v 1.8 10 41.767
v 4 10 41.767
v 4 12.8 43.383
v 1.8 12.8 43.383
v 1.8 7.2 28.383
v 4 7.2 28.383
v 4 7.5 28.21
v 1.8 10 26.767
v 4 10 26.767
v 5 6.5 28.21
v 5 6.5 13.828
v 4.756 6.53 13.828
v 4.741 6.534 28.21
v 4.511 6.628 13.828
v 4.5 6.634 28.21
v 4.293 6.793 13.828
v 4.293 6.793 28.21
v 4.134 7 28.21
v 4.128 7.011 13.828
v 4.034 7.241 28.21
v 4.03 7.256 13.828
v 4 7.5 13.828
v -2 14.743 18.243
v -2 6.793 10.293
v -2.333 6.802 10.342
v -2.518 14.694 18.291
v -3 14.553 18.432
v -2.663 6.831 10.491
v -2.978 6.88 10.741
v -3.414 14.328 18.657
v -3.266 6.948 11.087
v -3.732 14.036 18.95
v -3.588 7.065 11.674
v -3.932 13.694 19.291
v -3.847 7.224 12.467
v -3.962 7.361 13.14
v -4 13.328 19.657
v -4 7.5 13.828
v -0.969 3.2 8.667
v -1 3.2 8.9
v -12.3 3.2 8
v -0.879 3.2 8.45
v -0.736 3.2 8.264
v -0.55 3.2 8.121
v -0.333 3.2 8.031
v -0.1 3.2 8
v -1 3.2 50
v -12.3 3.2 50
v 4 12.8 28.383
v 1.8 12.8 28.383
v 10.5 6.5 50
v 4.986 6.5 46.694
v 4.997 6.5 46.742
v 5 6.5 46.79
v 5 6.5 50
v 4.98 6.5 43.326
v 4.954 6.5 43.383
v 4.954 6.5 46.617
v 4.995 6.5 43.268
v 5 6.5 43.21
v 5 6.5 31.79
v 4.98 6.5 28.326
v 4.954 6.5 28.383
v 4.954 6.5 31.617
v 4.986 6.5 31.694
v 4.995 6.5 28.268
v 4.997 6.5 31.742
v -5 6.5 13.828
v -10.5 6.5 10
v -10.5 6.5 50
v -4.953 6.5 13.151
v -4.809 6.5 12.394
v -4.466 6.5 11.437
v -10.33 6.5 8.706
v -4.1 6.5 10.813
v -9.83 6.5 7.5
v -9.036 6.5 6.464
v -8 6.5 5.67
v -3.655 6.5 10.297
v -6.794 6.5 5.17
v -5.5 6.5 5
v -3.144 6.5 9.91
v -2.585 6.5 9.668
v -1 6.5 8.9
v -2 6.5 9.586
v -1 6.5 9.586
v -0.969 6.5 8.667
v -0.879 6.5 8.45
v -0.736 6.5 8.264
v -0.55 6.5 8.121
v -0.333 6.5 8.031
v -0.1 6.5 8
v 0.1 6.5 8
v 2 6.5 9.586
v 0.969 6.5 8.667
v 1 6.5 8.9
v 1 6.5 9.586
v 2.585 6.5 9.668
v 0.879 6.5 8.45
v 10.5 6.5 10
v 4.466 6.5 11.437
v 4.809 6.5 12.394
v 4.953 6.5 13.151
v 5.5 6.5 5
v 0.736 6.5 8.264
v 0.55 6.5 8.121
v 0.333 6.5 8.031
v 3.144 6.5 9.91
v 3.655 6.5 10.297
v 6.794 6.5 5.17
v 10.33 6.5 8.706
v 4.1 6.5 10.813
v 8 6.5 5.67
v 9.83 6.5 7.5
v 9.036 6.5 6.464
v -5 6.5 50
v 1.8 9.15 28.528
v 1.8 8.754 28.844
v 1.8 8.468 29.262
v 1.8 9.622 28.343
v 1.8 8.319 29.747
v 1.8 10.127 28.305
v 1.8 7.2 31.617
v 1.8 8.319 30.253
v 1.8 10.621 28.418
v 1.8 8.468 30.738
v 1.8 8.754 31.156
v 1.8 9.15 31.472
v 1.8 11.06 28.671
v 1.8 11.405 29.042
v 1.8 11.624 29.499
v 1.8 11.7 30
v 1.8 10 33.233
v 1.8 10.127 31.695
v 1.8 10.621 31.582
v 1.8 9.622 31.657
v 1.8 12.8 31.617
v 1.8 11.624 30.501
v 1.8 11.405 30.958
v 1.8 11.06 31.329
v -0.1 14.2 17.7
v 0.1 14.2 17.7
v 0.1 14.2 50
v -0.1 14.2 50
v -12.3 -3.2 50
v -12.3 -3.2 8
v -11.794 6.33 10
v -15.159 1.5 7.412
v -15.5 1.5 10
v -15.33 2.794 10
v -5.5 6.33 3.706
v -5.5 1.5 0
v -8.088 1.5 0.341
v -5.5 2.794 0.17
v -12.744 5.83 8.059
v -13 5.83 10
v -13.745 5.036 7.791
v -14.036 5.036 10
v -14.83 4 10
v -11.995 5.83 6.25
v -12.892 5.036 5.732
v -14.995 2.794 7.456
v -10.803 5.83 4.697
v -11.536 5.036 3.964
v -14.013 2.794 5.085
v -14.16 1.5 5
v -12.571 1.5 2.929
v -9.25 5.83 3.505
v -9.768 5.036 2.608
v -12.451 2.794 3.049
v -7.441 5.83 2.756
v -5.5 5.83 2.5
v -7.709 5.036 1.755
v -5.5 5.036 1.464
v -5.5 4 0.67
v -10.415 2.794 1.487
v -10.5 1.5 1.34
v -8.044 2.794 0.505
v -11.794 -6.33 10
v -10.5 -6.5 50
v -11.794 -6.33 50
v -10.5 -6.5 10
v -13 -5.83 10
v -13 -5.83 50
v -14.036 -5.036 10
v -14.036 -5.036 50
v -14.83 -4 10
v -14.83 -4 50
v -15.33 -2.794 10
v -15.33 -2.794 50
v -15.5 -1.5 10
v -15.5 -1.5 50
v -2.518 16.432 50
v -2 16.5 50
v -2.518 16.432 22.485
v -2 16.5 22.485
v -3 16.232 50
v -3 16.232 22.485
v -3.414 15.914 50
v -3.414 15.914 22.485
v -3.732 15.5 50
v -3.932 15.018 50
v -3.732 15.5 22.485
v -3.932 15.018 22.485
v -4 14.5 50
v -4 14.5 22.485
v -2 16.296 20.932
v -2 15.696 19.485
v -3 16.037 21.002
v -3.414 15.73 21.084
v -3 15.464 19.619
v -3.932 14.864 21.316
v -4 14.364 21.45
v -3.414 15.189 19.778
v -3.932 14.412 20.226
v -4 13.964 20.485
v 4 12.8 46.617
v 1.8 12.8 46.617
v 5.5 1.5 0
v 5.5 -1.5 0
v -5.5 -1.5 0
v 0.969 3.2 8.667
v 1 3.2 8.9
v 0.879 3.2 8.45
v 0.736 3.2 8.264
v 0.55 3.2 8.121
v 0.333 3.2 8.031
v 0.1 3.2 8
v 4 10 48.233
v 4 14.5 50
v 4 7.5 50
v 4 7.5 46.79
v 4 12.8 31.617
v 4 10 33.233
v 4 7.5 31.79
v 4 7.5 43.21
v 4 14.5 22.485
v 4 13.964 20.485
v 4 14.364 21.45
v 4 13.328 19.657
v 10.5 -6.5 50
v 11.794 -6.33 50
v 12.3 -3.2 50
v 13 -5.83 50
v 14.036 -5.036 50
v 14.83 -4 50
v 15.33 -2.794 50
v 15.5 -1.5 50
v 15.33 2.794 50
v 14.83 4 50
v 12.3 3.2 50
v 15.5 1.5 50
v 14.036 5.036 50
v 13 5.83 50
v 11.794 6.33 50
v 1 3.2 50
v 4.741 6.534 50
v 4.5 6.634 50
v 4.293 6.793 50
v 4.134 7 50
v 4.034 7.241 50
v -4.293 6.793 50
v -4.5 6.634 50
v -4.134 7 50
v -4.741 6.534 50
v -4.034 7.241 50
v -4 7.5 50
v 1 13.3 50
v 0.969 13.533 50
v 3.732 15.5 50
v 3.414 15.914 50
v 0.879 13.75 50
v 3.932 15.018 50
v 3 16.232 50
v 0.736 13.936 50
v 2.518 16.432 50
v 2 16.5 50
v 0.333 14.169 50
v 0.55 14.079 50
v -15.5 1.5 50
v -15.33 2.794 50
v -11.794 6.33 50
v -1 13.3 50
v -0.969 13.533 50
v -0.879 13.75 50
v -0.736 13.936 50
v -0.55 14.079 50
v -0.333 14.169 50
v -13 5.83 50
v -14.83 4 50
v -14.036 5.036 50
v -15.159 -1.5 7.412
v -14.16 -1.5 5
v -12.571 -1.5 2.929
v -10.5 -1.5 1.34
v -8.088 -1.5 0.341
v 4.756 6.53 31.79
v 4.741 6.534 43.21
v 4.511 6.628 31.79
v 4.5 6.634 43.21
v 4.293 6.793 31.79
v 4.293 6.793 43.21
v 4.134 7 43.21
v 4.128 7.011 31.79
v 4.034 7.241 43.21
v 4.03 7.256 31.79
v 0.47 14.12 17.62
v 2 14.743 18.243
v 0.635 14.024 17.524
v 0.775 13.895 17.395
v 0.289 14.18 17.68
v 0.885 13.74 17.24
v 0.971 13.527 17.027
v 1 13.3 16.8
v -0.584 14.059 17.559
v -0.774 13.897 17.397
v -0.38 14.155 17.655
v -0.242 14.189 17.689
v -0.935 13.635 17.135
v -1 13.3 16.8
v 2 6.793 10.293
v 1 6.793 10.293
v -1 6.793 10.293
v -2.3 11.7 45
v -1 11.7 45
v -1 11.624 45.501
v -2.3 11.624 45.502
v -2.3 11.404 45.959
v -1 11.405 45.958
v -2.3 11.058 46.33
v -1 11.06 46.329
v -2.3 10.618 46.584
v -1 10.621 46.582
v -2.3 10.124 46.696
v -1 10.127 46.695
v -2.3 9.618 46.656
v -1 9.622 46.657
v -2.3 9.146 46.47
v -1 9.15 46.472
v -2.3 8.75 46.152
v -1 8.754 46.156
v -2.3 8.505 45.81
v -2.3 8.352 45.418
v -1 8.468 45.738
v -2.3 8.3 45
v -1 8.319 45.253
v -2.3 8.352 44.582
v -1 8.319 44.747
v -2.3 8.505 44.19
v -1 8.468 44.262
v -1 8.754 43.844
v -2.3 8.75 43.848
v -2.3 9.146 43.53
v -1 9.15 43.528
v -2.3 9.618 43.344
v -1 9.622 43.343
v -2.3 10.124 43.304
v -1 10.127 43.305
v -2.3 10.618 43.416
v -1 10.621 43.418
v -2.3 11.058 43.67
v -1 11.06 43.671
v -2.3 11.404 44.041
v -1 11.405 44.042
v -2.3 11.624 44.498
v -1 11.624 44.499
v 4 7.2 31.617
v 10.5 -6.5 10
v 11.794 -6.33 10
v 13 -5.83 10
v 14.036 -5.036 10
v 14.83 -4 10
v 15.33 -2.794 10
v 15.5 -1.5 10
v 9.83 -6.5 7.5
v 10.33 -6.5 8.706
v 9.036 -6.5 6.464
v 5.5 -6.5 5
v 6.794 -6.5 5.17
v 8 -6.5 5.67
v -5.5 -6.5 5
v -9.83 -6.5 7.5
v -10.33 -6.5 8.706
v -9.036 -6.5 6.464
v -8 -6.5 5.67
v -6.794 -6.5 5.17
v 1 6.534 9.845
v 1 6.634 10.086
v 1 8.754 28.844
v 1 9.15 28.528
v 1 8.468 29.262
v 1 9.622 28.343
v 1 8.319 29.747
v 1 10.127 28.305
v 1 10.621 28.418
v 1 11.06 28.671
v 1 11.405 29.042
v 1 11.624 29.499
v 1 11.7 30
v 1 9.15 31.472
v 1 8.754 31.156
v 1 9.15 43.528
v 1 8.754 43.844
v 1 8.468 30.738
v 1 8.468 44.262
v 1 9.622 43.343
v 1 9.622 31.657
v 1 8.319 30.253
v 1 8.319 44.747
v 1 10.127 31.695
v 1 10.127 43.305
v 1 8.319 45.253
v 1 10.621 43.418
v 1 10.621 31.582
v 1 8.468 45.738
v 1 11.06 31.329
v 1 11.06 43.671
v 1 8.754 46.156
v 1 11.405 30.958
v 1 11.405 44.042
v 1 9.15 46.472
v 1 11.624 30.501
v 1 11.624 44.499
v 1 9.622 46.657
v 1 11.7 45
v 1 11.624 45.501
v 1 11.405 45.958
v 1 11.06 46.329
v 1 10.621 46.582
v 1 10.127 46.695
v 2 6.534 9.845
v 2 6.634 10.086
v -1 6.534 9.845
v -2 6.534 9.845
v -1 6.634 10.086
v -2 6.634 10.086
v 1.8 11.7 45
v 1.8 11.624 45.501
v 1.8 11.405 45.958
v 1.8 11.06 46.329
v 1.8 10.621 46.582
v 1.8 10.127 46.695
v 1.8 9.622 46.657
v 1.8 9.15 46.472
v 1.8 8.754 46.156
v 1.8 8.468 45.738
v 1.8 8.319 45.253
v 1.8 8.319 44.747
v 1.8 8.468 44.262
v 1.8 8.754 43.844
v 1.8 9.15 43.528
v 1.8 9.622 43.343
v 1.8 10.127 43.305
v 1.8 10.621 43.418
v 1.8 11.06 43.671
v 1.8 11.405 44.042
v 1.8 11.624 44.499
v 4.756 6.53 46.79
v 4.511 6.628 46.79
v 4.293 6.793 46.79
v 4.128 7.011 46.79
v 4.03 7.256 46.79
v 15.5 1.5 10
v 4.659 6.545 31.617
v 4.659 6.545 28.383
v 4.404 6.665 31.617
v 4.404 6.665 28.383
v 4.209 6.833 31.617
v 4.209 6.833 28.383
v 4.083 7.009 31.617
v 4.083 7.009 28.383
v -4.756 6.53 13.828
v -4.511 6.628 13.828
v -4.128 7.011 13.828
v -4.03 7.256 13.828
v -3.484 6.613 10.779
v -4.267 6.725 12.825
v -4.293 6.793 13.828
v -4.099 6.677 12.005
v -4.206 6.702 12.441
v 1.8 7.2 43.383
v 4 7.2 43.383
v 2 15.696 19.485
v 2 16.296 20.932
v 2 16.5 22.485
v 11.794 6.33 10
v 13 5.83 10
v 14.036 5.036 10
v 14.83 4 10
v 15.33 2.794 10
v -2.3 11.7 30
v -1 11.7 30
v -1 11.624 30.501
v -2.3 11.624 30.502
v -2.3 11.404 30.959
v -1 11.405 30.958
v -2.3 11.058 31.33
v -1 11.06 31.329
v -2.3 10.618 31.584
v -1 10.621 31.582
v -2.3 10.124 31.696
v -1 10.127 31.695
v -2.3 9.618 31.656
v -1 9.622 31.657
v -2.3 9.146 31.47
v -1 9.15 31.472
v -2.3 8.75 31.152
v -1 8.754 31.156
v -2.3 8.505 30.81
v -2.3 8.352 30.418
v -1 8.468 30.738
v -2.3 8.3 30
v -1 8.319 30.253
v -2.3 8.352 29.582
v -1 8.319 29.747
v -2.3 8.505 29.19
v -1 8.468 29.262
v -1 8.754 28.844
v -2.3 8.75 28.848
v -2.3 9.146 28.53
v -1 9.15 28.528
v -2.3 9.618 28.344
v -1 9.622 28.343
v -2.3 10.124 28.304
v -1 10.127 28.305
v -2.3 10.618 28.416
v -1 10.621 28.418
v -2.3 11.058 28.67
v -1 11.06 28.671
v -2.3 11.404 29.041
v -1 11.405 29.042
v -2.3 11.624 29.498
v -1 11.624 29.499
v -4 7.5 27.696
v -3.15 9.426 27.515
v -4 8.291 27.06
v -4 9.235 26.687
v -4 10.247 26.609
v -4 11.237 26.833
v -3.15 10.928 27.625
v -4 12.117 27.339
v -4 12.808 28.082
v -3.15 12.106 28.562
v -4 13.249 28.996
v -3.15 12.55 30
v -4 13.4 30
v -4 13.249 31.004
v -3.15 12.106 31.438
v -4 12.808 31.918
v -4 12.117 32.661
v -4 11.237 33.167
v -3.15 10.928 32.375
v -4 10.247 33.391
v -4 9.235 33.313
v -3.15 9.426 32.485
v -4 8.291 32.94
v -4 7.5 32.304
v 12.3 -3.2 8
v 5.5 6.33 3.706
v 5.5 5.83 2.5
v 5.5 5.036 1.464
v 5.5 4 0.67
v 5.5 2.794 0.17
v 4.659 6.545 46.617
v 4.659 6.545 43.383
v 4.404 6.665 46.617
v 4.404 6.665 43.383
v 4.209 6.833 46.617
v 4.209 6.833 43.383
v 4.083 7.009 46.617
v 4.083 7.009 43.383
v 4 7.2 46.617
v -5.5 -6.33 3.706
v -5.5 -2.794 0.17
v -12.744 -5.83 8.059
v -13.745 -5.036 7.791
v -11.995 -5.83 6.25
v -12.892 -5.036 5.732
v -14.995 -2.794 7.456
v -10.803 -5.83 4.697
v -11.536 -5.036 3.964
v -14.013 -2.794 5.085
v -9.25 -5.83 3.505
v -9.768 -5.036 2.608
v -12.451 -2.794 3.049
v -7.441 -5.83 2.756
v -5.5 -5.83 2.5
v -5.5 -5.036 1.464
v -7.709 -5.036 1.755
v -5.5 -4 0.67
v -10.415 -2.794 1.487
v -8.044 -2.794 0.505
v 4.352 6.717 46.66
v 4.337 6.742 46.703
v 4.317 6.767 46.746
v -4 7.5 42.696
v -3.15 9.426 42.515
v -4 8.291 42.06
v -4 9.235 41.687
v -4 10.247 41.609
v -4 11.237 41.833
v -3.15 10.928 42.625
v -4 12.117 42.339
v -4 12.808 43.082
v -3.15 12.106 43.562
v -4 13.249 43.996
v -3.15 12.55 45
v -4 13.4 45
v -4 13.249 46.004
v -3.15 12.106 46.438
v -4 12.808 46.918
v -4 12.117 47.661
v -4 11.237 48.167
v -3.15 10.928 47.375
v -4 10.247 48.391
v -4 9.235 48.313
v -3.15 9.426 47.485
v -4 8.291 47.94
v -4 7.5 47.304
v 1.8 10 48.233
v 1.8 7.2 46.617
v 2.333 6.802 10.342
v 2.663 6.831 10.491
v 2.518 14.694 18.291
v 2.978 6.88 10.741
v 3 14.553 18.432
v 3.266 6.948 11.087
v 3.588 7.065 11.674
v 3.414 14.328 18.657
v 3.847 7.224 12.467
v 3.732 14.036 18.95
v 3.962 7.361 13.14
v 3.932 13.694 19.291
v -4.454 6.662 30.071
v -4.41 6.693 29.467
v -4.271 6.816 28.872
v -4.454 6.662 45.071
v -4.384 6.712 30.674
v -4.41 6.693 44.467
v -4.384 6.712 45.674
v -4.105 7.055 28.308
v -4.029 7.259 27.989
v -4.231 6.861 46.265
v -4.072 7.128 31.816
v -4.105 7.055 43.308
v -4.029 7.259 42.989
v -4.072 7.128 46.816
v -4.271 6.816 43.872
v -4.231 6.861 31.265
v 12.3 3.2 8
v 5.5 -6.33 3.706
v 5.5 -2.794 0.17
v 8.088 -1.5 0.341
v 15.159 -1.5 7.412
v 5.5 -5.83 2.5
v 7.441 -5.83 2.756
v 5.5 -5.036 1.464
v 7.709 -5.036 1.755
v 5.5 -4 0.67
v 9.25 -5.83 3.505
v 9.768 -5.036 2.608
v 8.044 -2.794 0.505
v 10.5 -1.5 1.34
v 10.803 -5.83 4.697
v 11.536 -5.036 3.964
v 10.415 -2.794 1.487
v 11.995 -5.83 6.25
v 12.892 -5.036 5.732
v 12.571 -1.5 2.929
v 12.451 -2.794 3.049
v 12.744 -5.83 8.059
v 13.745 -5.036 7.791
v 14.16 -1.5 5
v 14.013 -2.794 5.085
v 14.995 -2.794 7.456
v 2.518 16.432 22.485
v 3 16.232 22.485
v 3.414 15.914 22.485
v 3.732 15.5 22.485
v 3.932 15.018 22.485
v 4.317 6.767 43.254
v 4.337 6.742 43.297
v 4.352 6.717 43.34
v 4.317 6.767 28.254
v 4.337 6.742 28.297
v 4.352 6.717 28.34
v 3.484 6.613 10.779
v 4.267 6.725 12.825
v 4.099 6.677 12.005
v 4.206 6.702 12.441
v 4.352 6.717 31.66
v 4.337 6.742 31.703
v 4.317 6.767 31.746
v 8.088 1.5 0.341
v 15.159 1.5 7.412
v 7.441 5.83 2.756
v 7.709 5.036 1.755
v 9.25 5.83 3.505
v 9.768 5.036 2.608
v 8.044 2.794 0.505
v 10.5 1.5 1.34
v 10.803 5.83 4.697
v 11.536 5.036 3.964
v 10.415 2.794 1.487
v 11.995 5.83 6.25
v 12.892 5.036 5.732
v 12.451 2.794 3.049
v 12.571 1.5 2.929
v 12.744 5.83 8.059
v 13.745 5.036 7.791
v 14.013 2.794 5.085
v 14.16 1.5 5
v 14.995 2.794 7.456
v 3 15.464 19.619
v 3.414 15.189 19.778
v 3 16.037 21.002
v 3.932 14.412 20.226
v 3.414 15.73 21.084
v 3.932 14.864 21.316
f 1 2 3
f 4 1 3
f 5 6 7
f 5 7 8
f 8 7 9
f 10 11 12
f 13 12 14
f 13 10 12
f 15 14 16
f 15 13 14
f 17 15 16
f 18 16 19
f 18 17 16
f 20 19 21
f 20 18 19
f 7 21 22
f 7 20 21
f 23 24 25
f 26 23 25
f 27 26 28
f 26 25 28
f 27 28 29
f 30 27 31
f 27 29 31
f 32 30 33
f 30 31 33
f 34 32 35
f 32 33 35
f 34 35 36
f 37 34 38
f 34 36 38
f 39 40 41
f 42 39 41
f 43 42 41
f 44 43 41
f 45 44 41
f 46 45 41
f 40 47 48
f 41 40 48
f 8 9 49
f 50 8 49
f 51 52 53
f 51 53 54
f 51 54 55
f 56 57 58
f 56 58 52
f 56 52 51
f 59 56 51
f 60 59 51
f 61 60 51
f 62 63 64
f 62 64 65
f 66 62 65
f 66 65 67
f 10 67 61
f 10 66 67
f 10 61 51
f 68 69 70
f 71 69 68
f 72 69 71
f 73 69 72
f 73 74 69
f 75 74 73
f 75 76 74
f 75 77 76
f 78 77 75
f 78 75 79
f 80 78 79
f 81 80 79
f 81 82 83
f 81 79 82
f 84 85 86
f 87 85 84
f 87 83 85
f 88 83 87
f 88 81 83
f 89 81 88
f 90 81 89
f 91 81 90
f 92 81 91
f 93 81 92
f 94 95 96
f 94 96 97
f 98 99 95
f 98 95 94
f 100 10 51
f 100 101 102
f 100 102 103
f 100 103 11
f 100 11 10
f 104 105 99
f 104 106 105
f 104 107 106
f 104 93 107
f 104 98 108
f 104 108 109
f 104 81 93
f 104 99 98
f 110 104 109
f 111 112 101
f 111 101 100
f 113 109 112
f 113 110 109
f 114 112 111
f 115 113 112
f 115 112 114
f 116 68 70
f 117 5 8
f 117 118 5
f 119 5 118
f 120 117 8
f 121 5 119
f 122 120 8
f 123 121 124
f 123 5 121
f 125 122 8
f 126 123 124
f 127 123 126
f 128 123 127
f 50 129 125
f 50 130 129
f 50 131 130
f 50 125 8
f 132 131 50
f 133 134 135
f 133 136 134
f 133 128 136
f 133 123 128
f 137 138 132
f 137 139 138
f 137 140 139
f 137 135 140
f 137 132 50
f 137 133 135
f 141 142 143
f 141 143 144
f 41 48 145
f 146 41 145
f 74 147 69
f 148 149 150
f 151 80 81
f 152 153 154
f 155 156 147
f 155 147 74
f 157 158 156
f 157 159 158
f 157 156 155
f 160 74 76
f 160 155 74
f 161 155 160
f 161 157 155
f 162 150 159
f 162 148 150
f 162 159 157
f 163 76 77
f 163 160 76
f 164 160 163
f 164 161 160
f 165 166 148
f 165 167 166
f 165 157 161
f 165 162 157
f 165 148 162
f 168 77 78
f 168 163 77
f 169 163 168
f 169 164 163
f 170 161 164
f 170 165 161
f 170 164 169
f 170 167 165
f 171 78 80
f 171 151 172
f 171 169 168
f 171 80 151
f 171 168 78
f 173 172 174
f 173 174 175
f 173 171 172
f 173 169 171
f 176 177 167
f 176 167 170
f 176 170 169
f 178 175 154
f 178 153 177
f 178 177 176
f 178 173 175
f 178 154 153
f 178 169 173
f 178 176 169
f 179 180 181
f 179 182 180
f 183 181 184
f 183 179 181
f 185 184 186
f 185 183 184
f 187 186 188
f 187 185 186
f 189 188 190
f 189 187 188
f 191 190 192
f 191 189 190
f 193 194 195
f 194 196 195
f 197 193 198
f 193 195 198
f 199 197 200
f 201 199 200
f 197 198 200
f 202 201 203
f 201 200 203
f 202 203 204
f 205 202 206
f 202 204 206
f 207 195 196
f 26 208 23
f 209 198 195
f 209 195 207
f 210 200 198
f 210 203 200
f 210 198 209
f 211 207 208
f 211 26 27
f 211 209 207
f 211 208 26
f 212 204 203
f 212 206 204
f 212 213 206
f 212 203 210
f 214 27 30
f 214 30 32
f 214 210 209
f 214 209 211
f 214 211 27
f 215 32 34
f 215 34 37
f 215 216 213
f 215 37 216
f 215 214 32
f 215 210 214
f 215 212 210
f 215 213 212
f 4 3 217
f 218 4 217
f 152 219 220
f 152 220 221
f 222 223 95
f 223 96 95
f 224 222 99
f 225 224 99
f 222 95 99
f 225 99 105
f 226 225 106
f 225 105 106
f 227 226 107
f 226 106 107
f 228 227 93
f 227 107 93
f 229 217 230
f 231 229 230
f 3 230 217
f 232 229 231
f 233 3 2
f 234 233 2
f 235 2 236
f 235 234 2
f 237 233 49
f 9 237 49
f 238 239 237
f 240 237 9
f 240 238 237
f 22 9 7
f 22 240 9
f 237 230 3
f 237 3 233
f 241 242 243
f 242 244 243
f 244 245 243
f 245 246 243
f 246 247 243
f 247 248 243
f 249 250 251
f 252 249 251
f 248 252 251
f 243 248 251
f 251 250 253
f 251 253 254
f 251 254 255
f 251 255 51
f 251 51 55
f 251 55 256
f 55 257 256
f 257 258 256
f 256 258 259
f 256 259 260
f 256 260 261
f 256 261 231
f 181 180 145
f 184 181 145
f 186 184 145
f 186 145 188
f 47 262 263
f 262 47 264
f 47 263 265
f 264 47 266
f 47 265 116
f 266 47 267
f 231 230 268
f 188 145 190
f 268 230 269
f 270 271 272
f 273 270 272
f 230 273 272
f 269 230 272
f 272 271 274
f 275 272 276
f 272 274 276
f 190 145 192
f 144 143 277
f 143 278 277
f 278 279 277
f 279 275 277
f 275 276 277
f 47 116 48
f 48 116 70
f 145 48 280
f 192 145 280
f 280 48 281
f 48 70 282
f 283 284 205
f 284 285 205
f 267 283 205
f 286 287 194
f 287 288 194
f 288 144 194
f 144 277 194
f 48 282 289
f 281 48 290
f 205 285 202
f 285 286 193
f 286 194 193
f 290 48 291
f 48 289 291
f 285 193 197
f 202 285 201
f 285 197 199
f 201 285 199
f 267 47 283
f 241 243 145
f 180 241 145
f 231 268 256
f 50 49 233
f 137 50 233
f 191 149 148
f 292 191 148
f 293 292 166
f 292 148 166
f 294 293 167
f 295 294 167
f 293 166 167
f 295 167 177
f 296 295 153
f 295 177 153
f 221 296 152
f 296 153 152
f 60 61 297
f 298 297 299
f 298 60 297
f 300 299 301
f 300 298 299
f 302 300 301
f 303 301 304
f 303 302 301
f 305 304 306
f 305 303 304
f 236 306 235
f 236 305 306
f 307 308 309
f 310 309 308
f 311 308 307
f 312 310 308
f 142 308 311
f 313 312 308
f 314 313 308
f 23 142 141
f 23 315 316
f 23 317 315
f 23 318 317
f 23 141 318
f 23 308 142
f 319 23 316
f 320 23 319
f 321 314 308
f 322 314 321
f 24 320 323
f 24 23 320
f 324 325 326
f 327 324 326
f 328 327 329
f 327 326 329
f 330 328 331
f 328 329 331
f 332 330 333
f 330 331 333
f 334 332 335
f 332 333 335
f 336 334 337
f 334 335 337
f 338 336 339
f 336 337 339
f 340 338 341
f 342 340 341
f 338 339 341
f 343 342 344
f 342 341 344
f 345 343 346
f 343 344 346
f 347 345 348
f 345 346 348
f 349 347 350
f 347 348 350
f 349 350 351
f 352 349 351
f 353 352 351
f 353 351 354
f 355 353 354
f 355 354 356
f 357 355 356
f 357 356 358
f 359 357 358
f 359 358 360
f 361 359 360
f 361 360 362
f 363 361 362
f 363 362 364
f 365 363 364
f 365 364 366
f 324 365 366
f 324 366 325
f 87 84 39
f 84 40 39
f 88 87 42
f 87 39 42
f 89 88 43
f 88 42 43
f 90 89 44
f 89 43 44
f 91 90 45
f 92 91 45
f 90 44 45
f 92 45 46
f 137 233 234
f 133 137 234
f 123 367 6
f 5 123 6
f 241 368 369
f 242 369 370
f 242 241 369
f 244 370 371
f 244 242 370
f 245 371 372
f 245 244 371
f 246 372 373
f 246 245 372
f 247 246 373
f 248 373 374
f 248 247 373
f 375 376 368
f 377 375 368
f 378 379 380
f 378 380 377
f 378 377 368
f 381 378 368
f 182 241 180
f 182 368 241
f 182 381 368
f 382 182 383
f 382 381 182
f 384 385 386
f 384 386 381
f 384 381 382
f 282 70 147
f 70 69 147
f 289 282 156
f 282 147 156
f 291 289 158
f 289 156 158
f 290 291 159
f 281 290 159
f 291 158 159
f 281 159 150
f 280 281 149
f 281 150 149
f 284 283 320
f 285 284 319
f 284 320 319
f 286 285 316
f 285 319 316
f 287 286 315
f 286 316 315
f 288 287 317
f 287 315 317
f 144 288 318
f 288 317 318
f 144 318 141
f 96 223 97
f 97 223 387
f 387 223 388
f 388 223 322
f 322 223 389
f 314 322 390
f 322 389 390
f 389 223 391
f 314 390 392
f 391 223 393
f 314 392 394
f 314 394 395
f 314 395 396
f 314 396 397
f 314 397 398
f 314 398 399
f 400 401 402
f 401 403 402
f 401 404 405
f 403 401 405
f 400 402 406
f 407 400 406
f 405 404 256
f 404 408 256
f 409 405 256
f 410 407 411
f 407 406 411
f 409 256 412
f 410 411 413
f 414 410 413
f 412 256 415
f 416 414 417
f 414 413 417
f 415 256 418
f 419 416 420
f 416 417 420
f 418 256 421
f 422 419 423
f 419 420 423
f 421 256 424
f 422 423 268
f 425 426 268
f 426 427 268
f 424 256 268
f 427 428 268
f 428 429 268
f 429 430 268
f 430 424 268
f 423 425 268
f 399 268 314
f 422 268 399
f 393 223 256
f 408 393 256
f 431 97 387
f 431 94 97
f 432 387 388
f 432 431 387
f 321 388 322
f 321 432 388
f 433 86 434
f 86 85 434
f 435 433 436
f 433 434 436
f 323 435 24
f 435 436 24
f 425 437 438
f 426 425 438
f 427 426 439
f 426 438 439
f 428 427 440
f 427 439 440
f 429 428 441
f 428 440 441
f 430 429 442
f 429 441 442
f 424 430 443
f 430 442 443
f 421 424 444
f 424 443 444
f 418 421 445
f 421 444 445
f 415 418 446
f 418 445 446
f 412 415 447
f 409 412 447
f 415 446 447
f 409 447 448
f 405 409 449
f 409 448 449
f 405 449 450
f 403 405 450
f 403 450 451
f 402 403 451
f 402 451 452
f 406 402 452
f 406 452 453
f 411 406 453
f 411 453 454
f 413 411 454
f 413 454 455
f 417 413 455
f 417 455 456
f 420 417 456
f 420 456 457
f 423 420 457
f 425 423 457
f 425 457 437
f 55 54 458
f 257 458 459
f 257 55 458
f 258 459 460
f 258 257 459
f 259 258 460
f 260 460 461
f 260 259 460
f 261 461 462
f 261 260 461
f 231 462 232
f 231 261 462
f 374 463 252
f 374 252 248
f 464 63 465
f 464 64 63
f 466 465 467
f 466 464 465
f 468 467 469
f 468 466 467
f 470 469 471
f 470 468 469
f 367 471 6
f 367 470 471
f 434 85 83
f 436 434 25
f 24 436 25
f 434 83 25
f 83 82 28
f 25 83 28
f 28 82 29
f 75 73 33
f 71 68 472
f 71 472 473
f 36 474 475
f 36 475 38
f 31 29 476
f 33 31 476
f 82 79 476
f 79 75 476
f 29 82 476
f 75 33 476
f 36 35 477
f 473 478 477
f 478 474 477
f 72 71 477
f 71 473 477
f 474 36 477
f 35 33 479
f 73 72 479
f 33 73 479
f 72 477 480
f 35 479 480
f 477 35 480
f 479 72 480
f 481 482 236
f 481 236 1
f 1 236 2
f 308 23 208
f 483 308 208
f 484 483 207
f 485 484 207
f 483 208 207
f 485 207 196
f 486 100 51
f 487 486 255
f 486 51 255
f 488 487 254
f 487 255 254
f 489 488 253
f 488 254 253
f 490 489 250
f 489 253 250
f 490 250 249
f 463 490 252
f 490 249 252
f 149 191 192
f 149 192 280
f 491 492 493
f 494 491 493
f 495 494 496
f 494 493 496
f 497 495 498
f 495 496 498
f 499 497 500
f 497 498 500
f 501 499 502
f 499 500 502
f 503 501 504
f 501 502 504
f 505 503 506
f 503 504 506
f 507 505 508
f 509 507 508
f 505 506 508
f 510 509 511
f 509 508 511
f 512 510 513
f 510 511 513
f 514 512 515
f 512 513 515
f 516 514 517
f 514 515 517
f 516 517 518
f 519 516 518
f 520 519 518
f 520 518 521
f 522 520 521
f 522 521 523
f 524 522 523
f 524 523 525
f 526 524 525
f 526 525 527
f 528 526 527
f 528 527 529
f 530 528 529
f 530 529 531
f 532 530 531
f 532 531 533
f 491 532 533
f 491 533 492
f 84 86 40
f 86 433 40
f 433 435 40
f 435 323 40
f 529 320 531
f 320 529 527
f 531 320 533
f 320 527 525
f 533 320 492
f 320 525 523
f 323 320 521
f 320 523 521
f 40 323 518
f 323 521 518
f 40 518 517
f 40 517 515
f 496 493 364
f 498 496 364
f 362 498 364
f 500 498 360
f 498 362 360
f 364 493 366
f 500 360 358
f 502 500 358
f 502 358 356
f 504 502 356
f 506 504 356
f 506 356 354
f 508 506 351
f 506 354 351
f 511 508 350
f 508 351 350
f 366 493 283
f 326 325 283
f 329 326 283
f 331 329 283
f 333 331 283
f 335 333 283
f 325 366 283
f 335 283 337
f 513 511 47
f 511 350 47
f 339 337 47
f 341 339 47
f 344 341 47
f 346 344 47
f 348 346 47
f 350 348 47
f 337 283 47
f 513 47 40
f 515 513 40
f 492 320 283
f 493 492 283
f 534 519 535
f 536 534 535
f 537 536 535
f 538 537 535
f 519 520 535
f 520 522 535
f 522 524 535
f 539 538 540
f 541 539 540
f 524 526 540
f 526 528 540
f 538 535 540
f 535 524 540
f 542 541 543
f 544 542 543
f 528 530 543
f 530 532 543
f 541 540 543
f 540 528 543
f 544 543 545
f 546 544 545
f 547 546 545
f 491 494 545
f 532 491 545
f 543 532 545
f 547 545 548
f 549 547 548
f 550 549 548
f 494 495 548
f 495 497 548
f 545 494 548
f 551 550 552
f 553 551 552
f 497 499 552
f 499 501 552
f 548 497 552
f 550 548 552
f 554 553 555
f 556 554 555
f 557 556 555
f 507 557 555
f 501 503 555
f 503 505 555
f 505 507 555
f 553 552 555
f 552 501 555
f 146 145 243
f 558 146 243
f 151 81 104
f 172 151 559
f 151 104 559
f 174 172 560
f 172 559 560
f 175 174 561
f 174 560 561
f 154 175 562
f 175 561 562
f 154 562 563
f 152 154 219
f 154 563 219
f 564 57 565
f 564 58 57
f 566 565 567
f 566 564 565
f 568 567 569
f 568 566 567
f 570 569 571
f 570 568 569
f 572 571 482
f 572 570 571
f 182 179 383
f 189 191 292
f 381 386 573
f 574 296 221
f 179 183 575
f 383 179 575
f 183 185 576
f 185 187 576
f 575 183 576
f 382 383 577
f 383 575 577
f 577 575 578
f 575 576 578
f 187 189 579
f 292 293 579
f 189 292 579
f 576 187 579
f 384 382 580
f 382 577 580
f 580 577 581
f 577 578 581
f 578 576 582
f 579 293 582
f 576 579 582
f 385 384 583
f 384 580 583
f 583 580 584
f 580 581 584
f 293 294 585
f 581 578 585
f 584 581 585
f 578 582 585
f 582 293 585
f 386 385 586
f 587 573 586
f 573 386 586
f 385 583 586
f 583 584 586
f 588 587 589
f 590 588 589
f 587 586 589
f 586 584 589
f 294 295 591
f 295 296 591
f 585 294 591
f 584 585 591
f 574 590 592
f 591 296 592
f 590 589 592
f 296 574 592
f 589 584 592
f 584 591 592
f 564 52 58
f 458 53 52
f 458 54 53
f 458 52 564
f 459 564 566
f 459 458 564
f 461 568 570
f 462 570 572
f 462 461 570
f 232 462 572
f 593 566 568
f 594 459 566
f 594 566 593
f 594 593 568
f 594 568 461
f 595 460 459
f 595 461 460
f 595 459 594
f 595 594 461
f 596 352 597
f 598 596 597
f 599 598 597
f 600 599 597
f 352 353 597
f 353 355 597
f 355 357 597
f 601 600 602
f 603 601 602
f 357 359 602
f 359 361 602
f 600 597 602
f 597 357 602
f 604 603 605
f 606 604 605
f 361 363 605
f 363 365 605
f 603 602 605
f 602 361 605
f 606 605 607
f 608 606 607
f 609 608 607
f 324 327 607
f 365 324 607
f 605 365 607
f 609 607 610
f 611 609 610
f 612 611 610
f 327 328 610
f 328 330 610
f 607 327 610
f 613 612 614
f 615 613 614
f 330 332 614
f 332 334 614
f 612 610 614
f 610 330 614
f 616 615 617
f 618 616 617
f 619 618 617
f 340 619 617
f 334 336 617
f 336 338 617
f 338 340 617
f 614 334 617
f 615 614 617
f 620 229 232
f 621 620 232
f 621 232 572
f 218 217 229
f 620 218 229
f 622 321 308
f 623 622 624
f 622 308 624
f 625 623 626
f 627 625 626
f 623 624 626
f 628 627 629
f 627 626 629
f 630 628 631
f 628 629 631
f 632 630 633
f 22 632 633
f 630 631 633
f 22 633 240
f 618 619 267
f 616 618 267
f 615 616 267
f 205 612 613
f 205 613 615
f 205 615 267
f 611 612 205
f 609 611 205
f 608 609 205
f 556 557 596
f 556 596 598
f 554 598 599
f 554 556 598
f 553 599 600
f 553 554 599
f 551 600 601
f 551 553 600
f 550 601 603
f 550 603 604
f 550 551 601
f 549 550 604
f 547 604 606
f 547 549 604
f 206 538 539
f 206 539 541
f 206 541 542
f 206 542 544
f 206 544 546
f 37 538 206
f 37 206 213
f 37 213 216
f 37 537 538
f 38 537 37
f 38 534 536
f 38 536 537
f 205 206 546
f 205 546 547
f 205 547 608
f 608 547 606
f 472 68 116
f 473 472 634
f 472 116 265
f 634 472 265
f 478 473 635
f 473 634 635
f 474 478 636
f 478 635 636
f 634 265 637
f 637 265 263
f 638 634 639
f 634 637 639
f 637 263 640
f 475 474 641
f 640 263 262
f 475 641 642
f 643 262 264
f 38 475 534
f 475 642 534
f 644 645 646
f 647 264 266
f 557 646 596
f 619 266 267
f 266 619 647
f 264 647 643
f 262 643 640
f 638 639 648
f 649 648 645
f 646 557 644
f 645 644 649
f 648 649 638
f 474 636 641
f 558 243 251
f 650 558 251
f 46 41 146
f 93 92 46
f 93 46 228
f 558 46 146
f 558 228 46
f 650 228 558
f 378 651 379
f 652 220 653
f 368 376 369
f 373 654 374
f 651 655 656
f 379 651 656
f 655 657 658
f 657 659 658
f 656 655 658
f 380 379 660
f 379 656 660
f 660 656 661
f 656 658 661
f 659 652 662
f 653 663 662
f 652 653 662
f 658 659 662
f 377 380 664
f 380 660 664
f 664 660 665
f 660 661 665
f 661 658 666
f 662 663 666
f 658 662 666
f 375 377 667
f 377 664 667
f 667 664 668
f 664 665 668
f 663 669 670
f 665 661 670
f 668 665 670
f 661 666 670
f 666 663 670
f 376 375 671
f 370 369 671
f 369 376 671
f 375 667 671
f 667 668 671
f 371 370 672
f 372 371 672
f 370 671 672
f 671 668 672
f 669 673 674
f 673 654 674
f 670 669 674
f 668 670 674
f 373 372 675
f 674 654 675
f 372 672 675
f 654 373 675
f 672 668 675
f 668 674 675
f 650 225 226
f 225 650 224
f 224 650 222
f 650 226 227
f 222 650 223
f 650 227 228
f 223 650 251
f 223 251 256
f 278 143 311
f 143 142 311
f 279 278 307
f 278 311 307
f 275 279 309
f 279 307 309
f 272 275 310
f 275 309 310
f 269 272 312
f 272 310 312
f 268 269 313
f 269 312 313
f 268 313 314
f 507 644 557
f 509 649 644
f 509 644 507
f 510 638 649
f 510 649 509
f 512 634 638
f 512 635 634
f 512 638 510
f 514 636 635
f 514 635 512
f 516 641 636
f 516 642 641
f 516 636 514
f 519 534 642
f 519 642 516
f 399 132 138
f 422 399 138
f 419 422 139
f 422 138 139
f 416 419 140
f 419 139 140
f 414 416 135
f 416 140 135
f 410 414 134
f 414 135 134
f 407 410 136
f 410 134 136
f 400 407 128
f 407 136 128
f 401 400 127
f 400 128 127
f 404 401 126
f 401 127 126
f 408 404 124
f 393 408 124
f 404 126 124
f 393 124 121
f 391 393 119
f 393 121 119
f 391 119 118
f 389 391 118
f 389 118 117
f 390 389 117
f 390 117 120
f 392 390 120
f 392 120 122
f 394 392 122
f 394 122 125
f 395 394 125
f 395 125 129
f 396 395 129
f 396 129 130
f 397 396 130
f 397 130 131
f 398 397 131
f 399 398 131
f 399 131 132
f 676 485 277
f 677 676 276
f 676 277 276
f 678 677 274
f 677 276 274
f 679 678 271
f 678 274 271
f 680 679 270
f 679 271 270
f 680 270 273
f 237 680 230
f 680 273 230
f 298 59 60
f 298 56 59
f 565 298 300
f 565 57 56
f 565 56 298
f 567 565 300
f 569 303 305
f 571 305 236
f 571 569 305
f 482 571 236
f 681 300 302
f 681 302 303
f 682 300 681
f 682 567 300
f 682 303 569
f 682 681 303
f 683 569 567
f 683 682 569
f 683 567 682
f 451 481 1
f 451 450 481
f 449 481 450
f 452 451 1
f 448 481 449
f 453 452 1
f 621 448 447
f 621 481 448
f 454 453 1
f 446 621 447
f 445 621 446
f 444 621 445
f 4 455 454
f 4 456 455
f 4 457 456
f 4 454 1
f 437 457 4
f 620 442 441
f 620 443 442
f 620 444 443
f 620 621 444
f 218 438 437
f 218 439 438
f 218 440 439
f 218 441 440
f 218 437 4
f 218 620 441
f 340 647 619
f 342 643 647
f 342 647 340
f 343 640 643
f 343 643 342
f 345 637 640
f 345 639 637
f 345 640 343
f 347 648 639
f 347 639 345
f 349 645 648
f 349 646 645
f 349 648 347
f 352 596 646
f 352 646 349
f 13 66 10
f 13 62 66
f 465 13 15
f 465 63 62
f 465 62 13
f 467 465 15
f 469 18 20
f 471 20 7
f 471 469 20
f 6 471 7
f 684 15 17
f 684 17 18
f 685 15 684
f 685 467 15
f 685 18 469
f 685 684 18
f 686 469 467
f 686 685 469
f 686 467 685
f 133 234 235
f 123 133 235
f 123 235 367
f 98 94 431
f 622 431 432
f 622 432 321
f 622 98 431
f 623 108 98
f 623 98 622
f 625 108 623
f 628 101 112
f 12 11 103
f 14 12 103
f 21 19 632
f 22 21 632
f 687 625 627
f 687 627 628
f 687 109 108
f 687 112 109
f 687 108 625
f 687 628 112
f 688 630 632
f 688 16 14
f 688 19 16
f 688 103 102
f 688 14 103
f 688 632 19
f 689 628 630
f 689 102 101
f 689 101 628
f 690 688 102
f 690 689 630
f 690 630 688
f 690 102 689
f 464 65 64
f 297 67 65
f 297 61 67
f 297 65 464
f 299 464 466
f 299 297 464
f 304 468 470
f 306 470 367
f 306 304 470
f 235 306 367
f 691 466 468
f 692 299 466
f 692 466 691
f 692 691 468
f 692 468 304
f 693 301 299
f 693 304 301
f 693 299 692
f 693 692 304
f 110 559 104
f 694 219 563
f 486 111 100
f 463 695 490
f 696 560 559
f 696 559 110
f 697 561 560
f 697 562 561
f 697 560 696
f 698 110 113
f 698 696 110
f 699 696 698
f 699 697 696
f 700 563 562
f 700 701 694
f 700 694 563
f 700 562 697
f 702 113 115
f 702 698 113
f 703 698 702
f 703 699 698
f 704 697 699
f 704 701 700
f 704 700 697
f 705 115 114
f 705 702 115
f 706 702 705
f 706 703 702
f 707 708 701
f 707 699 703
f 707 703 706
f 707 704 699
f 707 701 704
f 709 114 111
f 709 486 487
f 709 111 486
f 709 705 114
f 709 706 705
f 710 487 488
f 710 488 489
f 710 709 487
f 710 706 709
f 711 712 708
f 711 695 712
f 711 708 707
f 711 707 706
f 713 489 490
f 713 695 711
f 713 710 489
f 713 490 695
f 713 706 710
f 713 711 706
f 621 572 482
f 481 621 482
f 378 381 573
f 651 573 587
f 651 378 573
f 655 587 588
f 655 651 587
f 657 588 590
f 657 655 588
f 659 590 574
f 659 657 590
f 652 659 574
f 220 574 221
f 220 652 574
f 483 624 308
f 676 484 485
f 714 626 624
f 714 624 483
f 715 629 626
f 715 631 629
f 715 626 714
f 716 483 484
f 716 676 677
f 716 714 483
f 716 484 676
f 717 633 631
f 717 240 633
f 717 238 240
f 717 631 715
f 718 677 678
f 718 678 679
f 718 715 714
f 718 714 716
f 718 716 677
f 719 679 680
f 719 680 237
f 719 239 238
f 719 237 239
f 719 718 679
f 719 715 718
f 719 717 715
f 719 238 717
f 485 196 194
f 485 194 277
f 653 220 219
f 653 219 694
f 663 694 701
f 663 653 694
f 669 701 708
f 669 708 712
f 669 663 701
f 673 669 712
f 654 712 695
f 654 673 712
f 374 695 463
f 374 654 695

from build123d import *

# Parameters (mm, degrees)
PAD_DEPTH       = 50
POCKET_DEPTH    = 42
POCKET001_DEPTH = 31.001
SKETCH003_R     = 1.7
POCKET002_DEPTH = 19.501
POCKET003_DEPTH = 2.2
FILLET_R        = 6
FILLET001_R     = 2
FILLET002_R     = 2
FILLET003_R     = 1
FILLET004_R     = 1
FILLET005_R     = 10
FILLET006_R     = 10
FILLET007_R     = 5
FILLET008_R     = 5
FILLET009_R     = 0.9
FILLET010_R     = 0.9
FILLET011_R     = 0.9
FILLET012_R     = 0.9
CHAMFER_SIZE    = 1.7
CHAMFER001_SIZE = 1.7


with BuildPart() as part:
    # Sketch → Pad (new body)
    with BuildSketch(Plane.XY):
        Polygon((15.5, 6.5), (15.5, -6.5), (-15.5, -6.5), (-15.5, 6.5), (-4, 6.5), (-4, 16.5), (4, 16.5), (4, 6.5), align=None)
    extrude(amount=PAD_DEPTH)

    # Sketch001 → Pocket (cut)
    with BuildSketch(Plane.XY.offset(50)):
        Polygon((-12.3, 3.2), (-12.3, -3.2), (12.3, -3.2), (12.3, 3.2), (1, 3.2), (1, 14.2), (-1, 14.2), (-1, 3.2), align=None)
    extrude(amount=-POCKET_DEPTH, mode=Mode.SUBTRACT)

    # Sketch002 → Pocket001 (cut, through all)
    with BuildSketch(Plane(origin=(-15.5, 0, 0), x_dir=(0, -1, 0), z_dir=(-1, 0, 0))):
        Polygon((-21.5, 25), (-6.5, 10), (-6.5, 0), (-21.5, 0), align=None)
    extrude(amount=-POCKET001_DEPTH, mode=Mode.SUBTRACT)

    # Sketch003 → Pocket002 (cut, through all)
    with BuildSketch(Plane.YZ.offset(4)):
        with Locations((10, 45)):
            Circle(SKETCH003_R)
        with Locations((10, 30)):
            Circle(SKETCH003_R)
    extrude(amount=-POCKET002_DEPTH, mode=Mode.SUBTRACT)

    # Sketch004 → Pocket003 (cut)
    with BuildSketch(Plane.YZ.offset(4)):
        Polygon((10, 48.233162), (7.2, 46.616581), (7.2, 43.383419), (10, 41.766838), (12.8, 43.383419), (12.8, 46.616581), align=None)
        Polygon((10, 33.233162), (7.2, 31.616581), (7.2, 28.383419), (10, 26.766838), (12.8, 28.383419), (12.8, 31.616581), align=None)
    extrude(amount=-POCKET003_DEPTH, mode=Mode.SUBTRACT)

    # Fillet
    fillet_edges = [part.edges().sort_by_distance(p)[0] for p in [
        (0, 16.5, 20),
    ]]
    fillet(fillet_edges, radius=FILLET_R)

    # Fillet001
    fillet001_edges = [part.edges().sort_by_distance(p)[0] for p in [
        (4, 10.62132, 14.12132),
    ]]
    fillet(fillet001_edges, radius=FILLET001_R)

    # Fillet002
    fillet002_edges = [part.edges().sort_by_distance(p)[0] for p in [
        (-4, 10.62132, 14.12132),
    ]]
    fillet(fillet002_edges, radius=FILLET002_R)

    # Fillet003
    fillet003_edges = [part.edges().sort_by_distance(p)[0] for p in [
        (4, 6.5, 31.414214),
    ]]
    fillet(fillet003_edges, radius=FILLET003_R)

    # Fillet004
    fillet004_edges = [part.edges().sort_by_distance(p)[0] for p in [
        (-4, 6.5, 31.414214),
    ]]
    fillet(fillet004_edges, radius=FILLET004_R)

    # Fillet005
    fillet005_edges = [part.edges().sort_by_distance(p)[0] for p in [
        (-15.5, 0, 0),
    ]]
    fillet(fillet005_edges, radius=FILLET005_R)

    # Fillet006
    fillet006_edges = [part.edges().sort_by_distance(p)[0] for p in [
        (15.5, 0, 0),
    ]]
    fillet(fillet006_edges, radius=FILLET006_R)

    # Fillet007
    fillet007_edges = [part.edges().sort_by_distance(p)[0] for p in [
        (15.5, 6.5, 30),
    ]]
    fillet(fillet007_edges, radius=FILLET007_R)

    # Fillet008
    fillet008_edges = [part.edges().sort_by_distance(p)[0] for p in [
        (15.5, -6.5, 30),
    ]]
    fillet(fillet008_edges, radius=FILLET008_R)

    # Fillet009
    fillet009_edges = [part.edges().sort_by_distance(p)[0] for p in [
        (-1, 14.2, 33.85),
    ]]
    fillet(fillet009_edges, radius=FILLET009_R)

    # Fillet010
    fillet010_edges = [part.edges().sort_by_distance(p)[0] for p in [
        (1, 14.2, 33.85),
    ]]
    fillet(fillet010_edges, radius=FILLET010_R)

    # Fillet011
    fillet011_edges = [part.edges().sort_by_distance(p)[0] for p in [
        (1, 4.85, 8),
    ]]
    fillet(fillet011_edges, radius=FILLET011_R)

    # Fillet012
    fillet012_edges = [part.edges().sort_by_distance(p)[0] for p in [
        (-1, 4.85, 8),
    ]]
    fillet(fillet012_edges, radius=FILLET012_R)

    # Chamfer
    chamfer_edges = [part.edges().sort_by_distance(p)[0] for p in [
        (-4, 8.3, 30),
    ]]
    chamfer(chamfer_edges, length=CHAMFER_SIZE)

    # Chamfer001
    chamfer001_edges = [part.edges().sort_by_distance(p)[0] for p in [
        (-4, 8.3, 45),
    ]]
    chamfer(chamfer001_edges, length=CHAMFER001_SIZE)


solid = part.part
